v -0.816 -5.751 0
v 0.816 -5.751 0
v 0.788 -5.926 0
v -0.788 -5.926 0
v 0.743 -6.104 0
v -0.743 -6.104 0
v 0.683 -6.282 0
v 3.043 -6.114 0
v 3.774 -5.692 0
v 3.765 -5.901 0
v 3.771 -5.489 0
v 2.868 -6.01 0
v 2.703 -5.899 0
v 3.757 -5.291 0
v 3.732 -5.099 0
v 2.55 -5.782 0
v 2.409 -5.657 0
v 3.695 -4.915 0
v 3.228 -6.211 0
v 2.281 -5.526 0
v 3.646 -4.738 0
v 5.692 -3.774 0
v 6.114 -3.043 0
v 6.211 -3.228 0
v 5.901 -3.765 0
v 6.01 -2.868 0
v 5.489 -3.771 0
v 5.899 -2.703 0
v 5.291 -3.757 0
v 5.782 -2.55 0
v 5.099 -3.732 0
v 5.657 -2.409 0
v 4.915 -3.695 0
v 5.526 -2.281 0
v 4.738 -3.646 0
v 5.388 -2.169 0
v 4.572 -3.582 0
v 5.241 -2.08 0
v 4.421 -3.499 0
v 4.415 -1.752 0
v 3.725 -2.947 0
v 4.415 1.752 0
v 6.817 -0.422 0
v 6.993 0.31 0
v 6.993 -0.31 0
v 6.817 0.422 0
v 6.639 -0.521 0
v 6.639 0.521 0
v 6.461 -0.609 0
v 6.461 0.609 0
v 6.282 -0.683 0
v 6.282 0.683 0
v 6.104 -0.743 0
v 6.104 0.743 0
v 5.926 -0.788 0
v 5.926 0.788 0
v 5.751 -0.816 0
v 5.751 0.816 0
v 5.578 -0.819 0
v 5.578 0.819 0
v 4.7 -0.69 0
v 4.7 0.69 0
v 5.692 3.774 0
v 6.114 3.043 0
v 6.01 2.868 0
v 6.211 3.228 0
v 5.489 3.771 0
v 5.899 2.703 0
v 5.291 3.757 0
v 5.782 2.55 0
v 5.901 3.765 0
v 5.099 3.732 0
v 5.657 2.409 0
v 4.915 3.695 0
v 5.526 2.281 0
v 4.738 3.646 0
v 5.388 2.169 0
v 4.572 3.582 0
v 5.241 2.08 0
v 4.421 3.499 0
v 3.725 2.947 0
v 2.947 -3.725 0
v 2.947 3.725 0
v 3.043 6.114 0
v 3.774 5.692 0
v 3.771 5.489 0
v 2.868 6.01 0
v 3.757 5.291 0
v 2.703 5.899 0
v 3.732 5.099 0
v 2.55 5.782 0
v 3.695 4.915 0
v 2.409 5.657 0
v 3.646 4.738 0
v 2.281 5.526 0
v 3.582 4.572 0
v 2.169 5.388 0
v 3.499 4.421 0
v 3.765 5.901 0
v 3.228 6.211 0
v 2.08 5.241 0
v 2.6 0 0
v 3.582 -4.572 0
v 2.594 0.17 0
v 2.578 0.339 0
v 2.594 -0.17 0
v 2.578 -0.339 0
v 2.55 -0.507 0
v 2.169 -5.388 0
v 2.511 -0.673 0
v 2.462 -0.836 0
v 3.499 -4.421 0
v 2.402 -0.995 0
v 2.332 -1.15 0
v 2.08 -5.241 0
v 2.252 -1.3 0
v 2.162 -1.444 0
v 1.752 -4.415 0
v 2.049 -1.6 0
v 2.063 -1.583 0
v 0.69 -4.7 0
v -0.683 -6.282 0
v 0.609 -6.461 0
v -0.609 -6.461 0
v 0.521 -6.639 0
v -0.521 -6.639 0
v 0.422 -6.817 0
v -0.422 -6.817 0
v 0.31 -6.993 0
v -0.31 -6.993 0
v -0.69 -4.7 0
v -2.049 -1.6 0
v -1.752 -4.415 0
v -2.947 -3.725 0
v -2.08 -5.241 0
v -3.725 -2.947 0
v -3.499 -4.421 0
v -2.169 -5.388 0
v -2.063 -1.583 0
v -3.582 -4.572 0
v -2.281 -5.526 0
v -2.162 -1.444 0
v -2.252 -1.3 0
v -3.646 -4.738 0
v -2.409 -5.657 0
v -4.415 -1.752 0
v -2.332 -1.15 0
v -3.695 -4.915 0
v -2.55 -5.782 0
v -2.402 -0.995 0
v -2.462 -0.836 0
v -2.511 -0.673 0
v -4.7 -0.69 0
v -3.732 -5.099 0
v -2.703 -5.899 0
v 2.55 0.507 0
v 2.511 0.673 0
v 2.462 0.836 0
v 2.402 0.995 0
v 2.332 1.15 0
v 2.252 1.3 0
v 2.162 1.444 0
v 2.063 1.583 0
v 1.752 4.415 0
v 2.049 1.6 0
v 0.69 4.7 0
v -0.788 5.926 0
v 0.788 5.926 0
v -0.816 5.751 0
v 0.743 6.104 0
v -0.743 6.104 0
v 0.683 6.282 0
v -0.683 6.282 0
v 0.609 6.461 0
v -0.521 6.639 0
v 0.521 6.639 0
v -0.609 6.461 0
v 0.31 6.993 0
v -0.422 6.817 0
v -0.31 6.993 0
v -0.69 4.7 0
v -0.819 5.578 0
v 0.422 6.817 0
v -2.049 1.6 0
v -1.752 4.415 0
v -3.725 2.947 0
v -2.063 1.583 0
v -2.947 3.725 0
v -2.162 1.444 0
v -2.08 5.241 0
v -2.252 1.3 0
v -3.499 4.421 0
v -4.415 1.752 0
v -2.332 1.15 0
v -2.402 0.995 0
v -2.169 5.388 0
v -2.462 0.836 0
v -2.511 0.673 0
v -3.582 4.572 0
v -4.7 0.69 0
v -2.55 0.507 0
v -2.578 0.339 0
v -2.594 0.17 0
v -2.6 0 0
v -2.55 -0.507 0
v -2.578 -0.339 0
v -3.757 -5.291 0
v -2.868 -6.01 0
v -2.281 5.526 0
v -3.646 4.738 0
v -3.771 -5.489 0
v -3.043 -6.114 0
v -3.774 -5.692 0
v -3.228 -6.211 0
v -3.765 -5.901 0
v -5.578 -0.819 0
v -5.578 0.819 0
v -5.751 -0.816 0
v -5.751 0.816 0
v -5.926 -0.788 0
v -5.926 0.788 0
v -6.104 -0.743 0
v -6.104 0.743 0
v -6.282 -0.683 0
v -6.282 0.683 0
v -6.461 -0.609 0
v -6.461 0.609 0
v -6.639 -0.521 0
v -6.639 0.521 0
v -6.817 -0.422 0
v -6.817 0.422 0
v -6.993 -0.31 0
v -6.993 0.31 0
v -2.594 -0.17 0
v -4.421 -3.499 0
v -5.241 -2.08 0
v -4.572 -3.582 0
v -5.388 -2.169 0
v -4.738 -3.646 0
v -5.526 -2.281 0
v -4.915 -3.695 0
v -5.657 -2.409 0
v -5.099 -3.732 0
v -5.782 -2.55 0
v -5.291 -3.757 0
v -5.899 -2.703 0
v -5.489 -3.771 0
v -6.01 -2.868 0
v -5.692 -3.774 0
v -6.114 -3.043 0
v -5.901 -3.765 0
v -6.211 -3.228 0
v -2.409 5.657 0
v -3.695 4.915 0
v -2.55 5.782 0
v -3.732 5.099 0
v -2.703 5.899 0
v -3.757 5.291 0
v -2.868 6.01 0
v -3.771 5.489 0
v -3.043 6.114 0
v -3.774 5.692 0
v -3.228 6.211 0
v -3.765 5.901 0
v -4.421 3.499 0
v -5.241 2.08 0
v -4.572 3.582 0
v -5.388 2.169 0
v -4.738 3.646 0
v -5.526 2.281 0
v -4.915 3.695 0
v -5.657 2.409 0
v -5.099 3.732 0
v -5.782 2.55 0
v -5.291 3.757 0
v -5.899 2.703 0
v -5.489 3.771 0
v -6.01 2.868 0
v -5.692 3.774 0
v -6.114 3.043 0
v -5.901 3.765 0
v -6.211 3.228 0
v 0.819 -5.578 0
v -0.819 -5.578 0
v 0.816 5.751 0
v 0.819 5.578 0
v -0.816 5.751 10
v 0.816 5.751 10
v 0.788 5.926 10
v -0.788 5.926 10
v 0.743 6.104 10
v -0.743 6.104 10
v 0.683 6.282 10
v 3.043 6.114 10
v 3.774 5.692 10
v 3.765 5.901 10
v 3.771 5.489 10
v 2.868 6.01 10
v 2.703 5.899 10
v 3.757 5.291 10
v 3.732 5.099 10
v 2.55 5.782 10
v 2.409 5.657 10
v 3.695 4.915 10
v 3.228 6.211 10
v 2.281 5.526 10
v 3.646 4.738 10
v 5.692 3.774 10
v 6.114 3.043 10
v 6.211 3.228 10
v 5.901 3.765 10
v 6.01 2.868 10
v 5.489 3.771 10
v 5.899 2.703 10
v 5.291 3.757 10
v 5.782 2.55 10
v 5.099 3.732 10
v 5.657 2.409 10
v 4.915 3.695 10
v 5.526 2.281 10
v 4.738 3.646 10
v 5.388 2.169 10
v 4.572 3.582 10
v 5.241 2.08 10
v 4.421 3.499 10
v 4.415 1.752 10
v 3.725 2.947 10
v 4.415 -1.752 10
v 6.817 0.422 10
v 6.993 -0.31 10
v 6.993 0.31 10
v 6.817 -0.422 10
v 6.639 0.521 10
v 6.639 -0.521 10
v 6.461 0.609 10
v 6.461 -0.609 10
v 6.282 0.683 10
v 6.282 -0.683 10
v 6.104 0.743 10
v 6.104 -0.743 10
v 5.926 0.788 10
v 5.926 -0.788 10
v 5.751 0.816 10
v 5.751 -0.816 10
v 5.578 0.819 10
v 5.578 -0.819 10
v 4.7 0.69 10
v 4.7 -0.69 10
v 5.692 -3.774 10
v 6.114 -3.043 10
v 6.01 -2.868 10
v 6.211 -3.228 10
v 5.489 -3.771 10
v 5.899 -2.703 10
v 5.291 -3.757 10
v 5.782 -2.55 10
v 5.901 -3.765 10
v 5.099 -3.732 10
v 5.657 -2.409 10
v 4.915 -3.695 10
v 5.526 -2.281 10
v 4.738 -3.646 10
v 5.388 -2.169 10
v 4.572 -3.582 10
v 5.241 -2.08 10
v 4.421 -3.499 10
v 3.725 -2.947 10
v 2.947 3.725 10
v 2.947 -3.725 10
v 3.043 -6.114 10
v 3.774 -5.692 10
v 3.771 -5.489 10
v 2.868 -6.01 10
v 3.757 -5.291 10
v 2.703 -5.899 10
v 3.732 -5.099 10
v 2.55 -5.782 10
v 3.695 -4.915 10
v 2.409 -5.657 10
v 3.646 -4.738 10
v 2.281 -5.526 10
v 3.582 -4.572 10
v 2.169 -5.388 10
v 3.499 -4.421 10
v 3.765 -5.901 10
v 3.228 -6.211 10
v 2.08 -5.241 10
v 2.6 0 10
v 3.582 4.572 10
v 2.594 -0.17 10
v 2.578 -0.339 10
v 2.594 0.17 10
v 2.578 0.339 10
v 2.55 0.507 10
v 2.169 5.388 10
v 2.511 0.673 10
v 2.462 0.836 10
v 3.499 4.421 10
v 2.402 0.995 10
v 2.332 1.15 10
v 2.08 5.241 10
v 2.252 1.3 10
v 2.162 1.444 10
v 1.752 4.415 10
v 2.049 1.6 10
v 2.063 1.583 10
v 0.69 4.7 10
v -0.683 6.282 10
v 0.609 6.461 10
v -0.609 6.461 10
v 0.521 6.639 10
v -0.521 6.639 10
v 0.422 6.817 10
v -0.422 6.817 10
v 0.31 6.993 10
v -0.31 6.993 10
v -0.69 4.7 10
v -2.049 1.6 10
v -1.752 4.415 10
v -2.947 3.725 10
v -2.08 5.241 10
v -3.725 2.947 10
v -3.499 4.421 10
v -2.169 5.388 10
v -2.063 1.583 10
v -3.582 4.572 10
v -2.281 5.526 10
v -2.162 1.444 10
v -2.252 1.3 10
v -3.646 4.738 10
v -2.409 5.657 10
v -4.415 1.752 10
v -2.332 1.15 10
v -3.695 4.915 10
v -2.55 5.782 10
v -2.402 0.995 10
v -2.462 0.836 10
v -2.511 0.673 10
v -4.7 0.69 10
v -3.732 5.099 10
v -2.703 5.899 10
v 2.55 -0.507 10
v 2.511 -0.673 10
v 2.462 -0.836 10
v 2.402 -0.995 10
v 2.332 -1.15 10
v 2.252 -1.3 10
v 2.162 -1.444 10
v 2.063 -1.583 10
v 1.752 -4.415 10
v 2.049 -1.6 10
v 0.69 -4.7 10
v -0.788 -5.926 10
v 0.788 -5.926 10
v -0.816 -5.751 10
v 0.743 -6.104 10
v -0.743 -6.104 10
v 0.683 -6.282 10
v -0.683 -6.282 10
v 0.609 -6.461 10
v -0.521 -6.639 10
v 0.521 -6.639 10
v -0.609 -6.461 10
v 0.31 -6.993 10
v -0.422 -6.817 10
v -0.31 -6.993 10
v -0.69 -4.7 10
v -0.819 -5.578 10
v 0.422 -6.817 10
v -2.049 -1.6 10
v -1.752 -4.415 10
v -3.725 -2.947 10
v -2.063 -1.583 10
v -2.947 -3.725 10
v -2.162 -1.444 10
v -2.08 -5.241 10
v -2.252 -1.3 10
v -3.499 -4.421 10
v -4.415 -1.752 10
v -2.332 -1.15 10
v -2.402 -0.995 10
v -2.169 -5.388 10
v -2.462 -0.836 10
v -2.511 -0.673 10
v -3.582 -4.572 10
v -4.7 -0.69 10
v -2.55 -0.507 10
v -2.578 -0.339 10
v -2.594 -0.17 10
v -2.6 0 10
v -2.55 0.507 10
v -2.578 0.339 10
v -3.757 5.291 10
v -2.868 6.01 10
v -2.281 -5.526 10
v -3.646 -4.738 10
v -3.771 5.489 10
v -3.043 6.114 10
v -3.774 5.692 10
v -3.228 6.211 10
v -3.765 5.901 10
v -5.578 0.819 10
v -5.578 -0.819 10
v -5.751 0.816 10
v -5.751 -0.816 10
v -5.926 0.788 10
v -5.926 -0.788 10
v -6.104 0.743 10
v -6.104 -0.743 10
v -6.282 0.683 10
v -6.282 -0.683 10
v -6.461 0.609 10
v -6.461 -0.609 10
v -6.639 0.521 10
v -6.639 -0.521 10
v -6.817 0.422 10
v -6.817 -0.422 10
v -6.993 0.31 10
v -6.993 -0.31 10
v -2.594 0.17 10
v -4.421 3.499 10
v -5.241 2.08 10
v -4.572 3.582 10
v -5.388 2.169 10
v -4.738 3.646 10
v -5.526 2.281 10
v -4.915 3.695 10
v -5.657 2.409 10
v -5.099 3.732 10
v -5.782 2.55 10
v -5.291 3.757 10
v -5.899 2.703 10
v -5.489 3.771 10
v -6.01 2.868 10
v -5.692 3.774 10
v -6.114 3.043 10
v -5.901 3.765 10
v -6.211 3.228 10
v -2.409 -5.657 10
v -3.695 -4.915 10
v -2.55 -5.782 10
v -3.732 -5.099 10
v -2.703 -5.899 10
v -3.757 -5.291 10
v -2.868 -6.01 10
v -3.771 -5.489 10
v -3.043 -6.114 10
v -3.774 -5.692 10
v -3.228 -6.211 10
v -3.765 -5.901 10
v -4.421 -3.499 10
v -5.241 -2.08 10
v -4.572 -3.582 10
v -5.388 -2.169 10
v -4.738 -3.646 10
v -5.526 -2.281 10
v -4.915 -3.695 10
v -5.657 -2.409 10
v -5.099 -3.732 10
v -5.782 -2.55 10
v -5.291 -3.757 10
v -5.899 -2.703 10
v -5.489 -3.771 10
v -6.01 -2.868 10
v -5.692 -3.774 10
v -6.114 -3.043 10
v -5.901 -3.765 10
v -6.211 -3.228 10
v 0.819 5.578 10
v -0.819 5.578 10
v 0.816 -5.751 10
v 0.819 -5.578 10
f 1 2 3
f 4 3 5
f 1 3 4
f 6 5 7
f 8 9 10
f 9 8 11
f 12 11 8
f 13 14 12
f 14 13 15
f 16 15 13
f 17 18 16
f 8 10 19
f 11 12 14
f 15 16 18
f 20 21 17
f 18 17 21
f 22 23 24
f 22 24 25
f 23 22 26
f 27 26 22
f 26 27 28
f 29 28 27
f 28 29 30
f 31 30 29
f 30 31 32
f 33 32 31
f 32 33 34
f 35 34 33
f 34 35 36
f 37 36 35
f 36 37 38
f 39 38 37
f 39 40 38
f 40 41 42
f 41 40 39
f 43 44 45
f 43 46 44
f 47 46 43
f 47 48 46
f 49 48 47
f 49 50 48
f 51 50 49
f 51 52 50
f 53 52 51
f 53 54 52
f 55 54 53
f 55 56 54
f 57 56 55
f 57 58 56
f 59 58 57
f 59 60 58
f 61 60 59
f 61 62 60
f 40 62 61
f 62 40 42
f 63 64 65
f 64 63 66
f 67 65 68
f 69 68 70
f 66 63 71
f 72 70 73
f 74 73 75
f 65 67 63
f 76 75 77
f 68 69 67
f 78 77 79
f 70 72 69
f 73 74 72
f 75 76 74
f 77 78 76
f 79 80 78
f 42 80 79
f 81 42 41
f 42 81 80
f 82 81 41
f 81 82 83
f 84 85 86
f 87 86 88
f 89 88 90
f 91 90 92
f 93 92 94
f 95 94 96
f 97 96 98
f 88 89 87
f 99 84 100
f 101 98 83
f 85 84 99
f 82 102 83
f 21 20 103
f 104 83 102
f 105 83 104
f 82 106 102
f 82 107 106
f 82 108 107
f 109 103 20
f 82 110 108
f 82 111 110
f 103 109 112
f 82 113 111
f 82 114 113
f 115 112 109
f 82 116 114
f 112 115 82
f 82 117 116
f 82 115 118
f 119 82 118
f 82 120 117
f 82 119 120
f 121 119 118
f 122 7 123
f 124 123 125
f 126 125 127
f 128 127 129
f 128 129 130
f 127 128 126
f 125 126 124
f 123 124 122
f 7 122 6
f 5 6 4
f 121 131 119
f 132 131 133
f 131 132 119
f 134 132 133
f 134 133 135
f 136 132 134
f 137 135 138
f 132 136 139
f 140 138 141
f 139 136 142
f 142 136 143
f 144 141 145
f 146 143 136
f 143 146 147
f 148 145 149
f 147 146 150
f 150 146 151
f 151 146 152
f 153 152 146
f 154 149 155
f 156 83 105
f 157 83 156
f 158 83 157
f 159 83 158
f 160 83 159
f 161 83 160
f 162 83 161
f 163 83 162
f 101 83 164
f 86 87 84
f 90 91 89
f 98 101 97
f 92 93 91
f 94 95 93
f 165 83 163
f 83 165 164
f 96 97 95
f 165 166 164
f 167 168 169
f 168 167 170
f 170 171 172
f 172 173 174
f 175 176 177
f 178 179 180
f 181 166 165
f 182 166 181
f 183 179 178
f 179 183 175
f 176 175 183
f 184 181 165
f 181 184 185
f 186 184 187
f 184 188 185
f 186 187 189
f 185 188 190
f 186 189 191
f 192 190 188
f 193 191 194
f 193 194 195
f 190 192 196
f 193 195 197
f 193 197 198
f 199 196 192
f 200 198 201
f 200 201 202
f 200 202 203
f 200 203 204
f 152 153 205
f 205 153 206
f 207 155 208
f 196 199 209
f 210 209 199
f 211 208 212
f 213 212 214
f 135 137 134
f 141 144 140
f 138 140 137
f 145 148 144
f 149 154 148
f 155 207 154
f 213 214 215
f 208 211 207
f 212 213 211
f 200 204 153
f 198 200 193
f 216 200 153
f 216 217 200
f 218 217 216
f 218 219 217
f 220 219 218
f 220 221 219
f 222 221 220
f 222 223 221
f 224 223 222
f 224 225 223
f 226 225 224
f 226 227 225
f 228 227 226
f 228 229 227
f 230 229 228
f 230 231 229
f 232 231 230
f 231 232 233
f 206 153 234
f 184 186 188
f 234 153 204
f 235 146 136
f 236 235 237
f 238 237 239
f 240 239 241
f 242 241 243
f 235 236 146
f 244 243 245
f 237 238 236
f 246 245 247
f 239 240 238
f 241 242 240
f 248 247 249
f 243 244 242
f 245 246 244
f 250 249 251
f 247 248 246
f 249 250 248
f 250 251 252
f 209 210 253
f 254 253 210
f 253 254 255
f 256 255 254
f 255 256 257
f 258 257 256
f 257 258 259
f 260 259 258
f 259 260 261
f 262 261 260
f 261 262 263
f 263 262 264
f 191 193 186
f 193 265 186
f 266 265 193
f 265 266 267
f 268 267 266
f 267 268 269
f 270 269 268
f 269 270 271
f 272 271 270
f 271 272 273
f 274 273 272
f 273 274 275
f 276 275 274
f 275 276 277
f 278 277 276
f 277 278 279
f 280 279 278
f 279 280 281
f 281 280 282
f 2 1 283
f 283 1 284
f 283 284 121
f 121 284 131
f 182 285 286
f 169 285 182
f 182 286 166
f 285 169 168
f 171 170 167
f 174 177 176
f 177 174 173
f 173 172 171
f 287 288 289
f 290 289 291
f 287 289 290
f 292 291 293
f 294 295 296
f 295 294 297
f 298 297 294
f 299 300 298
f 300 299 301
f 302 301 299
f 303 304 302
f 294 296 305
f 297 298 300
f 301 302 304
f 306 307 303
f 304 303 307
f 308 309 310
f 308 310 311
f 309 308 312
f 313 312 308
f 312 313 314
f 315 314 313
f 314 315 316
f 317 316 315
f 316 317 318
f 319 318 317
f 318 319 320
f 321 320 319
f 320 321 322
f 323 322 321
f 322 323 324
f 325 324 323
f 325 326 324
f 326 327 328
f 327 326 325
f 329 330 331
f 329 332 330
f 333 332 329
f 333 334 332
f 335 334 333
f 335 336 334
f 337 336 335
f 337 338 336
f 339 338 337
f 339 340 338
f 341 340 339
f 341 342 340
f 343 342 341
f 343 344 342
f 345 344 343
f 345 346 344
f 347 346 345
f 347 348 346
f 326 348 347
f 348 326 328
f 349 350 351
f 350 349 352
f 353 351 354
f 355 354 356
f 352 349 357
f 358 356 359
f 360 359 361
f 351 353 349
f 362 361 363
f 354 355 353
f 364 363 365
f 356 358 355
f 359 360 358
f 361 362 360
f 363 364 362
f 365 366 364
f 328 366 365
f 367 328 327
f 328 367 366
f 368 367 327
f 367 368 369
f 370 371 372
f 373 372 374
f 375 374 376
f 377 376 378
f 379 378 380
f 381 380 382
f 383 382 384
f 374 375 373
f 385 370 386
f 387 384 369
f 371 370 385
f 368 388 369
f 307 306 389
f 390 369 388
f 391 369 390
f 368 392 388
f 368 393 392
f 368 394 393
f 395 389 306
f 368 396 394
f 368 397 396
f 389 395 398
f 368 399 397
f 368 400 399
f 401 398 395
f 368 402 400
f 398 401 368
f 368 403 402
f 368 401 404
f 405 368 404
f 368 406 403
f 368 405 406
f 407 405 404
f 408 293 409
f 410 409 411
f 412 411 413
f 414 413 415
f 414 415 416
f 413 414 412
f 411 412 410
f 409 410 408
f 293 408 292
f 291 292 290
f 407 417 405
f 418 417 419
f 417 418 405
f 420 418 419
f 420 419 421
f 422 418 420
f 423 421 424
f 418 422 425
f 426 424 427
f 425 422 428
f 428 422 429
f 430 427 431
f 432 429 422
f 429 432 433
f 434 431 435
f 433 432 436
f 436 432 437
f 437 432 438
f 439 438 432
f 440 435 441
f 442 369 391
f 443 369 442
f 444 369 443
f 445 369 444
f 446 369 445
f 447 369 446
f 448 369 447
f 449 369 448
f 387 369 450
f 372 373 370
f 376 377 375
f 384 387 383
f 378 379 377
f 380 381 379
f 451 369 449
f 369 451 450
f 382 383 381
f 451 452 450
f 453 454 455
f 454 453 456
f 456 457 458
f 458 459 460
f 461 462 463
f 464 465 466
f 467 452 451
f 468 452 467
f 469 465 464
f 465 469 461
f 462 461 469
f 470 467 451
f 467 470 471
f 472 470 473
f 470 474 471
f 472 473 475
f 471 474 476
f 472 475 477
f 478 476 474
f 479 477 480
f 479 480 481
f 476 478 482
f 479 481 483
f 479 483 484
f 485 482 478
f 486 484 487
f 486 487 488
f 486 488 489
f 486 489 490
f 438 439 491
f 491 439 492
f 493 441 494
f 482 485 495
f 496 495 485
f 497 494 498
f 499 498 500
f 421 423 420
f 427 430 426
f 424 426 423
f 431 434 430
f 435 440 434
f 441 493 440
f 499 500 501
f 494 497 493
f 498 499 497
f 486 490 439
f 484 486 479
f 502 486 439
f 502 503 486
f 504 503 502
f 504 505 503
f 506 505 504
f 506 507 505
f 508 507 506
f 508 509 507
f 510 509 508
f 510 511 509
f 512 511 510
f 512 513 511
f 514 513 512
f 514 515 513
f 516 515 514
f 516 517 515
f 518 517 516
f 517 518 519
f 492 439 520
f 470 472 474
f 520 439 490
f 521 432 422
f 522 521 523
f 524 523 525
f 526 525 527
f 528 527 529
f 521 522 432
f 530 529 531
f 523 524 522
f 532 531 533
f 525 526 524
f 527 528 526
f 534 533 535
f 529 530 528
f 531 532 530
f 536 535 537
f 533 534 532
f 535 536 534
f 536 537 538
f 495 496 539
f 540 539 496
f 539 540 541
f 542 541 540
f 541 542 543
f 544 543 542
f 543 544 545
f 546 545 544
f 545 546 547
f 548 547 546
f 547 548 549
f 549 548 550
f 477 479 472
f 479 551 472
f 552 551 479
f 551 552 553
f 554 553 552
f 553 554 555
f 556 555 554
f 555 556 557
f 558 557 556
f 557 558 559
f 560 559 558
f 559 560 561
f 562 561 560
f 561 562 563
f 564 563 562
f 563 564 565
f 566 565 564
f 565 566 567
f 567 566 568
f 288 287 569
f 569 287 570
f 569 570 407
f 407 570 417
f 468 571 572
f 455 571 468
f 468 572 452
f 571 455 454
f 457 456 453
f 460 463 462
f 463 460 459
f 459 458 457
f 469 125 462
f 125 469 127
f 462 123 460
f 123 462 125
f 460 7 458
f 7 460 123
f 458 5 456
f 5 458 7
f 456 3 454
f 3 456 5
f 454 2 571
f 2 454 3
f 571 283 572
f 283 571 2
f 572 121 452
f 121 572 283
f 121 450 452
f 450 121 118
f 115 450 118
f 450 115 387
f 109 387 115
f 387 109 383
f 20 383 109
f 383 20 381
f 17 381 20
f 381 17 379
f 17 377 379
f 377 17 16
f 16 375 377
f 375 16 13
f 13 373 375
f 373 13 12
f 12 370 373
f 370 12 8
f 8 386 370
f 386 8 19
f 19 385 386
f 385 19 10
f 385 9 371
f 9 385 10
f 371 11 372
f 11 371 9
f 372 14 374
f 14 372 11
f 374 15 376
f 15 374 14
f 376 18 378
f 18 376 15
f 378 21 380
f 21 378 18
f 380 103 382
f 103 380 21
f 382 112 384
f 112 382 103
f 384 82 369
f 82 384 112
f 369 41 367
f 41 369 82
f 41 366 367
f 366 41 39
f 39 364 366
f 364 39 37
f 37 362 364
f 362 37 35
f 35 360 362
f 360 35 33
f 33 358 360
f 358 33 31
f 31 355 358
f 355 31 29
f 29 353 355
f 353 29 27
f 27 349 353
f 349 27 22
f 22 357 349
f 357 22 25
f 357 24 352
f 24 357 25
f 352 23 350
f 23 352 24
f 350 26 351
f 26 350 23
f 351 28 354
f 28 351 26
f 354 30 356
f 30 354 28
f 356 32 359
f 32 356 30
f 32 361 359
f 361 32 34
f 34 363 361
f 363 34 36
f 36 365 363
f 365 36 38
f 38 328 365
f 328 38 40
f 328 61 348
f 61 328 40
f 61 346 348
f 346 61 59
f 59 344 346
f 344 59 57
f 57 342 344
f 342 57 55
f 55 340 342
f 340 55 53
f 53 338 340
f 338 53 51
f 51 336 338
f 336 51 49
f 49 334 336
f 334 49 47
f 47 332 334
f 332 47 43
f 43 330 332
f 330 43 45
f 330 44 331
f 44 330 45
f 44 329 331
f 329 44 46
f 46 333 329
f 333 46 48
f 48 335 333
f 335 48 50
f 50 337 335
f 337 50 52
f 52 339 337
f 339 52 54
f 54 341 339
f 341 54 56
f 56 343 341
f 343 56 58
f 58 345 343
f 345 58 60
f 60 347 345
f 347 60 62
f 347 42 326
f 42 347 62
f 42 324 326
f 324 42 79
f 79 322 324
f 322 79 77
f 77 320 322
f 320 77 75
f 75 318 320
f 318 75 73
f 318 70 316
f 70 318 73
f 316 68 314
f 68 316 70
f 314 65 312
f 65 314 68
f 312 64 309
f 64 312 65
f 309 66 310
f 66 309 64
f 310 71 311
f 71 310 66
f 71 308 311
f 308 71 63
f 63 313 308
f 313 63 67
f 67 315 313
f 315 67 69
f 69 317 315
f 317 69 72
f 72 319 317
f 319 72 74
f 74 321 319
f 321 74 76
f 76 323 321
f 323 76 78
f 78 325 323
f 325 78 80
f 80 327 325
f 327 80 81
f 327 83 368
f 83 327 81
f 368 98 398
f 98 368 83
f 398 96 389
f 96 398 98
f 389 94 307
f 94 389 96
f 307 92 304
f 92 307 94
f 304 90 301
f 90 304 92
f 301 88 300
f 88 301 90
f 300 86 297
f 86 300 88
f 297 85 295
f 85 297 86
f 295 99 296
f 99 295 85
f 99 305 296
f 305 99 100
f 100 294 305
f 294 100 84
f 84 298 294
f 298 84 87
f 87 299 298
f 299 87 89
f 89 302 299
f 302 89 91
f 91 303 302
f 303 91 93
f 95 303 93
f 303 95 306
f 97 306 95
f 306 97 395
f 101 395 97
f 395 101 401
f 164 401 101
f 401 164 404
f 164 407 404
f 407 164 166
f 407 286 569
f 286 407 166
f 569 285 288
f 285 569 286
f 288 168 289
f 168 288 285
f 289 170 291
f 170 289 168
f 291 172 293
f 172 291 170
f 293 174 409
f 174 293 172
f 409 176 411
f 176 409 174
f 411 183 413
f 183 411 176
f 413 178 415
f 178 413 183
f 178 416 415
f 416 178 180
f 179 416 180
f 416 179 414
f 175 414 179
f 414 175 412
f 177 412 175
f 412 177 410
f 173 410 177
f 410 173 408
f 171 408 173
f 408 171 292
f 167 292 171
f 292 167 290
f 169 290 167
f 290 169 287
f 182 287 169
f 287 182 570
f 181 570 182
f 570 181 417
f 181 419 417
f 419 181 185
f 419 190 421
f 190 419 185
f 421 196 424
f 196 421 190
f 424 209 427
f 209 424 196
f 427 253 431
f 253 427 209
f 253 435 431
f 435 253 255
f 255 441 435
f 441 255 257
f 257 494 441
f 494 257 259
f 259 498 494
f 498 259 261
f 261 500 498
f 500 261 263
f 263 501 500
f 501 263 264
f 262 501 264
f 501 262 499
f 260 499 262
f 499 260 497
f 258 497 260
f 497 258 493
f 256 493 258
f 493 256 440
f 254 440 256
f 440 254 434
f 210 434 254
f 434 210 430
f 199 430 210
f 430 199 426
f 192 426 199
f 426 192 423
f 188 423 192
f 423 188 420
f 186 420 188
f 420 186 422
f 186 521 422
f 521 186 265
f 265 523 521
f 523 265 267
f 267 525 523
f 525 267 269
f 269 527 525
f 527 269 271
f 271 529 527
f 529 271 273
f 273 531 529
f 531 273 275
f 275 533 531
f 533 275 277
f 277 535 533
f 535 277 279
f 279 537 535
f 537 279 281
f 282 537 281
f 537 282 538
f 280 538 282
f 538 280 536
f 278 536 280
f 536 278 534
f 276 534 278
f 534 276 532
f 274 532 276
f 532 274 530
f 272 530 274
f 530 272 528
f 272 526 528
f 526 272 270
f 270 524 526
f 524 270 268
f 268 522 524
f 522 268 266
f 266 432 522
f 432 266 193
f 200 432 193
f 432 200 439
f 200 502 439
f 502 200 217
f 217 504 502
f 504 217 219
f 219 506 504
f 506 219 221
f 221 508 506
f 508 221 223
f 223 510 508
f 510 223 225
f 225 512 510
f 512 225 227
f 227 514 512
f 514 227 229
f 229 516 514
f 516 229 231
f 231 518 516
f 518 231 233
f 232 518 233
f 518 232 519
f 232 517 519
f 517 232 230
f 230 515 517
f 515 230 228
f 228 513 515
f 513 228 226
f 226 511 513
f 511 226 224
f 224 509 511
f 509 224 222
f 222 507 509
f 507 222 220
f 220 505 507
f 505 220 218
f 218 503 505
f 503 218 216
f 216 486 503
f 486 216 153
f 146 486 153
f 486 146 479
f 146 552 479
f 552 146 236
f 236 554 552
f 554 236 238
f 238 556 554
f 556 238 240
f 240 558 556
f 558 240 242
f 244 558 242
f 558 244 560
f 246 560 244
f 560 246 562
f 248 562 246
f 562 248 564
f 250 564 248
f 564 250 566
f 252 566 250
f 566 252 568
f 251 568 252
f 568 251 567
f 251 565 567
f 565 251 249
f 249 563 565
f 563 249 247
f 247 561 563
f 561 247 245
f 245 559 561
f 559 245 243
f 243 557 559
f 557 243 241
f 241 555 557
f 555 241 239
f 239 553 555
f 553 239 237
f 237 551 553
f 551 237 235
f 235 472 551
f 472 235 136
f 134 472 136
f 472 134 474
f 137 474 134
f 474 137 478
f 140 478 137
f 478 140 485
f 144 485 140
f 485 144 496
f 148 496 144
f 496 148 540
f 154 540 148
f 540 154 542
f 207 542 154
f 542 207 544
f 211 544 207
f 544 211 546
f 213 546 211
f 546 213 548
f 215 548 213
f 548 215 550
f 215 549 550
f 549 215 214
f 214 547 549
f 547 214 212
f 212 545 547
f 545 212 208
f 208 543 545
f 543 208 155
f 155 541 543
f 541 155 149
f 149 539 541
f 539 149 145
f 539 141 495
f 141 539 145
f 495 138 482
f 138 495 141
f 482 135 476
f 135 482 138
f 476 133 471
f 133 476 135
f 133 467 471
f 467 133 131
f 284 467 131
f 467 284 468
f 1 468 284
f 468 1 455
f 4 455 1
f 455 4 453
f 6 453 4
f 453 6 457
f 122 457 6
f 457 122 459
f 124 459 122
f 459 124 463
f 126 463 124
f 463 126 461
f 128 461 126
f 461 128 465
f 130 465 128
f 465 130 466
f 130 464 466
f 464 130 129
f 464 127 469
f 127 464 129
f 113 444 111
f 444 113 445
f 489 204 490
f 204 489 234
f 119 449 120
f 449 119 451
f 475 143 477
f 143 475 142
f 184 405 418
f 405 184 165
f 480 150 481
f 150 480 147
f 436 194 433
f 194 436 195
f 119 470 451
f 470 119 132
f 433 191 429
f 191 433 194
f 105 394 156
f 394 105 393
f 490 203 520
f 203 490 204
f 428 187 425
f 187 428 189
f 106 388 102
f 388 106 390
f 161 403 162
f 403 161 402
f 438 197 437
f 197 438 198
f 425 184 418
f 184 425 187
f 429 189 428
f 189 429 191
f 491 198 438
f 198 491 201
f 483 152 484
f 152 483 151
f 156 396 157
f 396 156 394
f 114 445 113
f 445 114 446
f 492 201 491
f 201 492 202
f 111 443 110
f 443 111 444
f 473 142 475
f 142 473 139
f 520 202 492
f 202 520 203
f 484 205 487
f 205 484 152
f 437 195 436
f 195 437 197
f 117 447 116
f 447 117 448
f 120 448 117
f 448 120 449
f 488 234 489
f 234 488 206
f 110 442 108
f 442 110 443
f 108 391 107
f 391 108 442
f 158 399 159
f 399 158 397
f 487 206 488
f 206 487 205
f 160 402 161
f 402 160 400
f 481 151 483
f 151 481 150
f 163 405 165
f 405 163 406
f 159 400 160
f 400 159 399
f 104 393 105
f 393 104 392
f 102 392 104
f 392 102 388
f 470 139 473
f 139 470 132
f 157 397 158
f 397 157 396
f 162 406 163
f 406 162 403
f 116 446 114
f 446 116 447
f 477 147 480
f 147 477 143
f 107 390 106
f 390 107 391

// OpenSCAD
// file: involute_gear.scad
// ---------------------------------------------------------------
// involute_gear.scad  -  minimal involute spur gear library
// Matches the Onshape "Spur Gear" FeatureScript parameters used in
// the mircoscpe_z_axis_motor document (module, teeth, 20 deg PA).
// No dependencies.  Units: mm.
// ---------------------------------------------------------------

function _inv(a) = tan(a) - a * PI / 180;          // involute function (a in deg) -> rad
function _polar(r, a_rad) = [r * cos(a_rad * 180 / PI), r * sin(a_rad * 180 / PI)];

// 2D outline of an involute spur gear, centred at origin
module spur_gear_2d(teeth = 20, mod = 1, pressure_angle = 20, clearance = 0.25, steps = 8) {
    rp = mod * teeth / 2;                 // pitch radius
    rb = rp * cos(pressure_angle);        // base radius
    ra = rp + mod;                        // addendum (tip) radius
    rf = rp - (1 + clearance) * mod;      // dedendum (root) radius
    half = PI / (2 * teeth) + _inv(pressure_angle);   // half tooth angle at base circle (rad)
    r0 = max(rb, rf);
    flank = [for (i = [0:steps]) let(r = r0 + (ra - r0) * i / steps) [r, half - _inv(acos(min(1, rb / r)))]];
    pts = [for (t = [0:teeth - 1]) let(c = 2 * PI * t / teeth) each concat(
              [_polar(rf, c - half)],
              [for (f = flank) _polar(f[0], c - f[1])],
              [for (i = [len(flank) - 1:-1:0]) _polar(flank[i][0], c + flank[i][1])],
              [_polar(rf, c + half)]
          )];
    polygon(pts);
}

// 3D gear.  bore: diameter (0 = none).  d_flat: across-flats for a D/double-D bore (0 = round)
module spur_gear(teeth = 20, mod = 1, thickness = 10, bore = 0, d_flat = 0,
                 pressure_angle = 20, bore_chamfer = 0) {
    difference() {
        linear_extrude(thickness) spur_gear_2d(teeth, mod, pressure_angle);
        if (bore > 0) {
            translate([0, 0, -1]) linear_extrude(thickness + 2)
                intersection() {
                    circle(d = bore, $fn = 96);
                    if (d_flat > 0) square([bore + 2, d_flat], center = true);
                }
            if (bore_chamfer > 0 && d_flat == 0) for (z = [0, thickness])
                translate([0, 0, z]) mirror([0, 0, z > 0 ? 1 : 0])
                    translate([0, 0, -0.01]) cylinder(d1 = bore + 2 * bore_chamfer + 0.02, d2 = bore, h = bore_chamfer + 0.01, $fn = 96);
        }
    }
}
// main file
// gear_byj48 : 12 teeth, module 1, PA 20 deg, 10 mm thick, double-D bore for 28BYJ-48 stepper shaft
// Bore: D5.2 with two flats 3.2 mm apart (shaft is 5 mm / 3 mm flats -> 0.2 mm clearance)
// Onshape also has a 0.2 mm chamfer (Chamfer 1) - omitted here.
include <involute_gear.scad>
spur_gear(teeth = 12, mod = 1, thickness = 10, bore = 5.2, d_flat = 3.2);
